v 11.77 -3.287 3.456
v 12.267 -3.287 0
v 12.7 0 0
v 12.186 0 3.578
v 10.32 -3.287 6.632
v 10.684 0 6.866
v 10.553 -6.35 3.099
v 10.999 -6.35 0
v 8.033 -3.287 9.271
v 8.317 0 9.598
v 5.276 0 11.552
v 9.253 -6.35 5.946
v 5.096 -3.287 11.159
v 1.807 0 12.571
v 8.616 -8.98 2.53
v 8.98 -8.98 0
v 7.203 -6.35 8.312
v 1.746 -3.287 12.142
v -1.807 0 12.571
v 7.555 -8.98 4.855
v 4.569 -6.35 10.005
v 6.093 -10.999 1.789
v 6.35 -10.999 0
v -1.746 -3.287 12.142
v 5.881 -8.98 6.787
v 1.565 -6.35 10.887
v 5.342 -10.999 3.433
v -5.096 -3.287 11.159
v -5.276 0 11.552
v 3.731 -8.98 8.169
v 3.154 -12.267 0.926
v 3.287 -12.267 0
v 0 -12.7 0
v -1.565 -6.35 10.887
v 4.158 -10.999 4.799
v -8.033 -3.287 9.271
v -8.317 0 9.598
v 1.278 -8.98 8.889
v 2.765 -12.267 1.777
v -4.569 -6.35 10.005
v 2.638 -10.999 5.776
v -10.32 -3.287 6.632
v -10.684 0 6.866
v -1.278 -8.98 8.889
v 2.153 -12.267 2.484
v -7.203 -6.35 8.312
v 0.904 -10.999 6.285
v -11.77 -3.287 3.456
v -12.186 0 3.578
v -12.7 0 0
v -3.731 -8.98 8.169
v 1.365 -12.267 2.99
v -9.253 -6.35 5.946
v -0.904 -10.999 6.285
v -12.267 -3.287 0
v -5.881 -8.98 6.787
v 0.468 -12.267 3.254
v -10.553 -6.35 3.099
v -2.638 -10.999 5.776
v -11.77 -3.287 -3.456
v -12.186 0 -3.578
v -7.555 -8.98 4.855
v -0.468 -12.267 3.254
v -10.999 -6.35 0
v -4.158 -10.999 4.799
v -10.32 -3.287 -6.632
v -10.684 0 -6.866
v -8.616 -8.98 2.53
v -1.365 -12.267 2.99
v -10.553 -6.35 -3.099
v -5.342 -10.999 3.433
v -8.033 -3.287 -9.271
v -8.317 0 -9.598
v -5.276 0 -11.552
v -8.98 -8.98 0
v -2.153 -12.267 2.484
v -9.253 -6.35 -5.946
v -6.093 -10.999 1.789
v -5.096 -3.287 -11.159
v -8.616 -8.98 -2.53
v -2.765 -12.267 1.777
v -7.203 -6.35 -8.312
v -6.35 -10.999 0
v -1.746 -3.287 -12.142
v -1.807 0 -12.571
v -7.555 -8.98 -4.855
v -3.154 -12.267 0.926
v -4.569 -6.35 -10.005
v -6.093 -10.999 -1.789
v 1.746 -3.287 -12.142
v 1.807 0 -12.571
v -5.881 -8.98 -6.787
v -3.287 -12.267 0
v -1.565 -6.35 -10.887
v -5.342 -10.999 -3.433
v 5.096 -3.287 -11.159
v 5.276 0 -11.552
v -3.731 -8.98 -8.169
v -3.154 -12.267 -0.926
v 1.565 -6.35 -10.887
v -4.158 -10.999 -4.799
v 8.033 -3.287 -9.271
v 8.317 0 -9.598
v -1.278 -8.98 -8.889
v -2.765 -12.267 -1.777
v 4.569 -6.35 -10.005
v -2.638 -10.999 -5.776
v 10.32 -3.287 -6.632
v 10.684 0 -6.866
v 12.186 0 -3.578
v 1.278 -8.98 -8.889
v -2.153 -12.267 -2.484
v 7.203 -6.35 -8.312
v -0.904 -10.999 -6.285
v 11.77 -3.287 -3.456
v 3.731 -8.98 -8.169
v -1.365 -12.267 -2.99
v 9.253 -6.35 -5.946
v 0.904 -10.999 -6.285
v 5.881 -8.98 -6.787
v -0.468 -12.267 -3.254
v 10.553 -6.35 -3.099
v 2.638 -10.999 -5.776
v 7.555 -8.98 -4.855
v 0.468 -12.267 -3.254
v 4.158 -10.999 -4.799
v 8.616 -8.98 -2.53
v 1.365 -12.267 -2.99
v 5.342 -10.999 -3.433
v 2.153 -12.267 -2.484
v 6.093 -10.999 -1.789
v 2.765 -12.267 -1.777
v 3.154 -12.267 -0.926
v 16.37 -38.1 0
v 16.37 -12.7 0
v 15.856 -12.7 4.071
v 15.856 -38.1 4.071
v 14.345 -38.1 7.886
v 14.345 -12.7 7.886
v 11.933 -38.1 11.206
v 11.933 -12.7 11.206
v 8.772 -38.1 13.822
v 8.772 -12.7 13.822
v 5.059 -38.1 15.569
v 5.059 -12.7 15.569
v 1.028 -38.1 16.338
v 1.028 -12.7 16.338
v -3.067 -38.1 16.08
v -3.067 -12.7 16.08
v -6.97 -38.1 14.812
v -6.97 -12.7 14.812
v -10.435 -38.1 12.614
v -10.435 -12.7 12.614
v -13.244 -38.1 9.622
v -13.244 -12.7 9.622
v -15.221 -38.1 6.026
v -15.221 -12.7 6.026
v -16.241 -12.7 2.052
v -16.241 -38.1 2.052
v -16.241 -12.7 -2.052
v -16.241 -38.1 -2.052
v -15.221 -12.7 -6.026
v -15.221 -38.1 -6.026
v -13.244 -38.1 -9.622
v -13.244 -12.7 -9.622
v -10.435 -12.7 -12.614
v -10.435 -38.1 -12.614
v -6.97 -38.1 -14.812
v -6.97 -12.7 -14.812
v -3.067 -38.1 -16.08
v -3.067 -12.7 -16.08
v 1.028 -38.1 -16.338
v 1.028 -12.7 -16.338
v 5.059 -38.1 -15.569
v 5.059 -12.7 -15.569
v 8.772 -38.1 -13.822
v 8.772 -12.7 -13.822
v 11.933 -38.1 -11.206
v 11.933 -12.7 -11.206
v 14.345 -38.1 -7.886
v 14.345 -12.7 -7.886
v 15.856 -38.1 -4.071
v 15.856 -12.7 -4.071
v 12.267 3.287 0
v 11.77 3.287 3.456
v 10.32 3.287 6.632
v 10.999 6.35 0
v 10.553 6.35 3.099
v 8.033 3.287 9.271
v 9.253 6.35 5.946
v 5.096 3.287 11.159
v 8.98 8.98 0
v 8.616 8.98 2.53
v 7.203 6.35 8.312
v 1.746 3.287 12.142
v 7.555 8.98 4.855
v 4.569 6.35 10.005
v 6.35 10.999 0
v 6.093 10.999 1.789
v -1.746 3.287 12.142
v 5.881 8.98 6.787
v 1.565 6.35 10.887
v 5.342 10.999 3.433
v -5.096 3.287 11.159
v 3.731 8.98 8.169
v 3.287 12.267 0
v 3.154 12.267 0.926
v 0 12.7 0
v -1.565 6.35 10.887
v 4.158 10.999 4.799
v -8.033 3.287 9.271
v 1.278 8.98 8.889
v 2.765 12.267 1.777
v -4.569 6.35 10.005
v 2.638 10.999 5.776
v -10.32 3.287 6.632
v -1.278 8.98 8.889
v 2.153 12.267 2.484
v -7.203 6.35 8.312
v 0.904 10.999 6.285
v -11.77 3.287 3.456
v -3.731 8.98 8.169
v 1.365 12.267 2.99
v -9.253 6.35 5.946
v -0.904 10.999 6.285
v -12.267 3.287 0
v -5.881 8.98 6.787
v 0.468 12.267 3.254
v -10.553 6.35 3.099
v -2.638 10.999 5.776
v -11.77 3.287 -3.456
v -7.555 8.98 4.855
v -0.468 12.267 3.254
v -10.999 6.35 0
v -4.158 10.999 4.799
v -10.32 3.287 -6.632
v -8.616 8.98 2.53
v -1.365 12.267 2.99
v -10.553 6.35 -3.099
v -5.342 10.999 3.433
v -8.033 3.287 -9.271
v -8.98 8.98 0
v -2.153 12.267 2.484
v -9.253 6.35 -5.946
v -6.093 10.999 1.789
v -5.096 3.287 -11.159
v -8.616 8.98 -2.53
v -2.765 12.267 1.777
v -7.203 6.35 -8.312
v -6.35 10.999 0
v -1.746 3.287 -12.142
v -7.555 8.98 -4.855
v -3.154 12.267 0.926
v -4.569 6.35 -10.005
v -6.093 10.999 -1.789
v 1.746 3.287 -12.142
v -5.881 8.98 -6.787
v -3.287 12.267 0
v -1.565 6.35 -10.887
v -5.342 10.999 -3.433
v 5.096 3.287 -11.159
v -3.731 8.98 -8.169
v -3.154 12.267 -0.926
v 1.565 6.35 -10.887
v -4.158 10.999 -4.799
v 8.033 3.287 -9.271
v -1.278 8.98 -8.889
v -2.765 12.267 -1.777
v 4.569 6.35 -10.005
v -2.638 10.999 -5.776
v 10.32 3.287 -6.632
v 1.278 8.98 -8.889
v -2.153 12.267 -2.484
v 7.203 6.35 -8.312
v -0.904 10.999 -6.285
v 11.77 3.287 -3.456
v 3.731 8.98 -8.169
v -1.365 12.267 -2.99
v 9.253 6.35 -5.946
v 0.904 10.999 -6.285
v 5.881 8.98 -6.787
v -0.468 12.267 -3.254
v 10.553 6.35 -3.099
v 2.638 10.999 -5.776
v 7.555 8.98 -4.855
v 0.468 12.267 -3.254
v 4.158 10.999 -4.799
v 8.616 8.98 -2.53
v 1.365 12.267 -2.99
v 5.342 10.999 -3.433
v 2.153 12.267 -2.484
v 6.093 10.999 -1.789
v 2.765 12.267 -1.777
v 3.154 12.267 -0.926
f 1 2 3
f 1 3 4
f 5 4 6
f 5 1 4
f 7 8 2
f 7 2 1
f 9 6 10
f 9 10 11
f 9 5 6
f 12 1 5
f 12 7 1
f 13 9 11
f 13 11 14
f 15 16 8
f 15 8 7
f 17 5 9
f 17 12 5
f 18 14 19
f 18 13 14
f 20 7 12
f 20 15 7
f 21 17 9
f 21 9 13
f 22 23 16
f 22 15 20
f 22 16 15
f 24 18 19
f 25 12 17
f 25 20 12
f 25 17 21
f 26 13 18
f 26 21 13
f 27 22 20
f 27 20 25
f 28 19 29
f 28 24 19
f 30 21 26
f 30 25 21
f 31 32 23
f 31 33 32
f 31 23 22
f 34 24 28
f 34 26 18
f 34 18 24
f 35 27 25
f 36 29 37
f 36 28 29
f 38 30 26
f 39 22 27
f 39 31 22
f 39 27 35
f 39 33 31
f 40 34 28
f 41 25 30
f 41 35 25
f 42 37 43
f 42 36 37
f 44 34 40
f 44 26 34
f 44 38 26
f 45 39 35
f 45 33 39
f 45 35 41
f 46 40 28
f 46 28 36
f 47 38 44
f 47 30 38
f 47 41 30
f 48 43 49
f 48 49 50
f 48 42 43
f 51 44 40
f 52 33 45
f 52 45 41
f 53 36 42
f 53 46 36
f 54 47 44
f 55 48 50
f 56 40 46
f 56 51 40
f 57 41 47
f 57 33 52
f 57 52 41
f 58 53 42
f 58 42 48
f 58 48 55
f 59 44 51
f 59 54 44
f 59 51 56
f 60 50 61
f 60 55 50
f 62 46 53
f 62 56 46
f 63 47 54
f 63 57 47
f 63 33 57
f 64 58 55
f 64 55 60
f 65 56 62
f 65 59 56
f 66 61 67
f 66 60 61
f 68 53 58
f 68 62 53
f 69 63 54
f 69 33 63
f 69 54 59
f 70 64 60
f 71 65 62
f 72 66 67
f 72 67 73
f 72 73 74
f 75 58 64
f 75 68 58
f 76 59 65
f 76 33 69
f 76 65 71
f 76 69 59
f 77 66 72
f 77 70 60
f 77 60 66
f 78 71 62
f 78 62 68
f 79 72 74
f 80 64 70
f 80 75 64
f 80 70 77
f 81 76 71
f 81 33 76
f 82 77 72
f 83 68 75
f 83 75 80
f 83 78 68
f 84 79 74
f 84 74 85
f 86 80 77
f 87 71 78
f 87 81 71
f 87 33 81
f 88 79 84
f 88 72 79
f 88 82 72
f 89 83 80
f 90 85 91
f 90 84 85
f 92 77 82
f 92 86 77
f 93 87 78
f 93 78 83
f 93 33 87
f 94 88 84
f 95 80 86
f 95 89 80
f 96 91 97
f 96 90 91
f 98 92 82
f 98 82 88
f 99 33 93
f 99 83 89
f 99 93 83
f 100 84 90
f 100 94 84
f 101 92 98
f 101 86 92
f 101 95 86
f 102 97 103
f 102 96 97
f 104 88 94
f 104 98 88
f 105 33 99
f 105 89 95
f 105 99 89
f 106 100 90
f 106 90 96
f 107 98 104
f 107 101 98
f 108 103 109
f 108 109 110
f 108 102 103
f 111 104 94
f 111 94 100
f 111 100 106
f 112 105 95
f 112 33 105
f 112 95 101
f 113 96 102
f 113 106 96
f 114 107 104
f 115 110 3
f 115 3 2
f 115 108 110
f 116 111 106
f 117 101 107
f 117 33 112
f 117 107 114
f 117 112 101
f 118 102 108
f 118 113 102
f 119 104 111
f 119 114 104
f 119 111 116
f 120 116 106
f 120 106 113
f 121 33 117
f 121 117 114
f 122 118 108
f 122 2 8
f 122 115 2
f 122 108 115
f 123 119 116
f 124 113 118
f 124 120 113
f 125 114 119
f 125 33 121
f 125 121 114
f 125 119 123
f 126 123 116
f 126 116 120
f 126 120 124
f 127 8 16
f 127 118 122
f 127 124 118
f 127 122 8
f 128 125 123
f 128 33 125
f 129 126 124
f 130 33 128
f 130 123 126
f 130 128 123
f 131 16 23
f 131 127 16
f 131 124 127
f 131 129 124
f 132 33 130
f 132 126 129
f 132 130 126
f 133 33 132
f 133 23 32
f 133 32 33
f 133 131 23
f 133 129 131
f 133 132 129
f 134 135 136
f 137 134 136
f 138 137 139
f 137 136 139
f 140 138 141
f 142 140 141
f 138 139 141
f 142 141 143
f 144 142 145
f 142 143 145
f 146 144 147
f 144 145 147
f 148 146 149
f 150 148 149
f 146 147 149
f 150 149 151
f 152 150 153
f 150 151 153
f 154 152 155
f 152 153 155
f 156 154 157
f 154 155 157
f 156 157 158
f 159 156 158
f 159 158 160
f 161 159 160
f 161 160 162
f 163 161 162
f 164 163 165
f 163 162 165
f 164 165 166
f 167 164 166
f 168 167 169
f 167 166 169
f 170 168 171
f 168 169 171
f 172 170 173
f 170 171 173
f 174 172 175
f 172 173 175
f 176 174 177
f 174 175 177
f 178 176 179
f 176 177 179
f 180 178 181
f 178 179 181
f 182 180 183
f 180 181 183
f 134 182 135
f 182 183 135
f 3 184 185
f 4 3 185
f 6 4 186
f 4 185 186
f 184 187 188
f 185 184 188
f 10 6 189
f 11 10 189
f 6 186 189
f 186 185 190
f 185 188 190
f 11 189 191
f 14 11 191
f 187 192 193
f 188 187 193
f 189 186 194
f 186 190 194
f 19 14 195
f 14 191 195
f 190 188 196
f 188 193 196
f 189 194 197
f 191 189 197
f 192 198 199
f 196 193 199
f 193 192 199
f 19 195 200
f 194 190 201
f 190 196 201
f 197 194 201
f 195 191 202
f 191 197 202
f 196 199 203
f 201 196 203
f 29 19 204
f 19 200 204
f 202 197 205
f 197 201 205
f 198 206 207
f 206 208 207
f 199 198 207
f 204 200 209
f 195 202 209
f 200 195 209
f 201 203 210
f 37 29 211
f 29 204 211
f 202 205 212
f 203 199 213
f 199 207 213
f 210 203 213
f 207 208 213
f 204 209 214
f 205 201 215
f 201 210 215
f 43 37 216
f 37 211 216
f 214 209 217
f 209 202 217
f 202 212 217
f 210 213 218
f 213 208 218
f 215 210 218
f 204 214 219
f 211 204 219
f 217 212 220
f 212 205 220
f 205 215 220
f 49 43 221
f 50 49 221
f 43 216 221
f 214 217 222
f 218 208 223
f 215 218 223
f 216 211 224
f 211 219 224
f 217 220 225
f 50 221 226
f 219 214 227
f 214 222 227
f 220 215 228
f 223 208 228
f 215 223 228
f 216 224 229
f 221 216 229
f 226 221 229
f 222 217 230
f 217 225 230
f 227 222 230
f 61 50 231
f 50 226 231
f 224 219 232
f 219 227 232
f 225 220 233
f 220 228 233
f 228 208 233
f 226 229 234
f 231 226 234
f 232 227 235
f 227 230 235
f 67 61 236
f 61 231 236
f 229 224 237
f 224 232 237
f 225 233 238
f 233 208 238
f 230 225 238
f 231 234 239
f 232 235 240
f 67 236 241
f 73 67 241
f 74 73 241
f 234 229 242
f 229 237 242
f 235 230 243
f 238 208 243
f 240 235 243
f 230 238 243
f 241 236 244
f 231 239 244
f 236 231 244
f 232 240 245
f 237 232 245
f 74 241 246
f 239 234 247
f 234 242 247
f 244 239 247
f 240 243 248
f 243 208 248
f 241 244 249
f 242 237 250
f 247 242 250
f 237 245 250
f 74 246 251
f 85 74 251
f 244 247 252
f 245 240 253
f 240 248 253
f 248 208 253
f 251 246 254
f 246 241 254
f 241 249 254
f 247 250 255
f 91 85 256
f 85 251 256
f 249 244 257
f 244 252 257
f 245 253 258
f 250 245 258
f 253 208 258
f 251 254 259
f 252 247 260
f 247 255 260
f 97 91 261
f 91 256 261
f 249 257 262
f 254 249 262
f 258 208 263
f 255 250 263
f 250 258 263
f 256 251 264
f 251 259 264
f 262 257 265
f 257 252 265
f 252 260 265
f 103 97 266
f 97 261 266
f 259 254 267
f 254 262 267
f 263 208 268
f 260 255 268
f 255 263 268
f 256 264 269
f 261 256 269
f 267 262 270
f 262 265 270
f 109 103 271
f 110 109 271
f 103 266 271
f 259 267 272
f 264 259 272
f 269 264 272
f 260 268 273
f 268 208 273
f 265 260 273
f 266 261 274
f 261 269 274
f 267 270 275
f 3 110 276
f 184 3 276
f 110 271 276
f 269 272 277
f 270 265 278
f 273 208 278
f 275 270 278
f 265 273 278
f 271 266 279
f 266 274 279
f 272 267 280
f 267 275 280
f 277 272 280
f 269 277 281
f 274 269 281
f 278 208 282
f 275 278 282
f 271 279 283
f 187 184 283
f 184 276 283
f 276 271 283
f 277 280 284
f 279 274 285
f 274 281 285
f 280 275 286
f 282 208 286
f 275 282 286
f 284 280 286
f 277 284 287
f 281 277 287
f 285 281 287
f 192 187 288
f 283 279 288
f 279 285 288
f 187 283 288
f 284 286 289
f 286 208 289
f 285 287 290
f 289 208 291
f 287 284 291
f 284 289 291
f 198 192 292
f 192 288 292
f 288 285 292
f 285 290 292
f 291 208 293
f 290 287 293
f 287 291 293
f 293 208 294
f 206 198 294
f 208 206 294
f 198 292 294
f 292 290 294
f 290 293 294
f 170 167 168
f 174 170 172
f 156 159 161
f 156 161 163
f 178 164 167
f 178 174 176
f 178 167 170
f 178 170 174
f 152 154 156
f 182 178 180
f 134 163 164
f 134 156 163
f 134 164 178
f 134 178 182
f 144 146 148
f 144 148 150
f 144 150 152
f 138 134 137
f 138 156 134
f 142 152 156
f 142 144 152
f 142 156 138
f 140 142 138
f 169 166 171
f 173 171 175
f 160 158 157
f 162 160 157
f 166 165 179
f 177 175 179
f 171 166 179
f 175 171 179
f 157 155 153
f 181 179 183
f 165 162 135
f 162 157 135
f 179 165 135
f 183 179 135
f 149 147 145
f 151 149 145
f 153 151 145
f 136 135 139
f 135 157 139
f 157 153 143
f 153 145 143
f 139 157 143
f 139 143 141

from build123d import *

# Parameters (mm, degrees)
F0_R     = 12.7
F1_DEPTH = 12.7
F2_R     = 12.69999
F4_R     = 16.3703
F5_DEPTH = 25.4


# Not quite as in the source:
# - a fillet or chamfer is up to 0.001 mm smaller than in the source, because OpenCascade refuses the exact size


with BuildPart() as f1:
    # F0 (on Front) → F1 (new body, symmetric)
    with BuildSketch(Plane.XZ):
        Circle(F0_R)
    extrude(amount=F1_DEPTH, both=True)

    # F2 (radius 12.7 in the source; OpenCascade refuses exactly that, so slightly less here)
    f2_edges = [f1.edges().sort_by_distance(p)[0] for p in [
        (-12.7, -12.7, 0),
        (-12.7, 12.7, 0),
    ]]
    fillet(f2_edges, radius=F2_R)


with BuildPart() as f5:
    # F4 (on offset) → F5 (new body)
    with BuildSketch(Plane.XZ.offset(12.7)):
        Circle(F4_R)
    extrude(amount=F5_DEPTH)


solid = Compound([f1.part, f5.part])
